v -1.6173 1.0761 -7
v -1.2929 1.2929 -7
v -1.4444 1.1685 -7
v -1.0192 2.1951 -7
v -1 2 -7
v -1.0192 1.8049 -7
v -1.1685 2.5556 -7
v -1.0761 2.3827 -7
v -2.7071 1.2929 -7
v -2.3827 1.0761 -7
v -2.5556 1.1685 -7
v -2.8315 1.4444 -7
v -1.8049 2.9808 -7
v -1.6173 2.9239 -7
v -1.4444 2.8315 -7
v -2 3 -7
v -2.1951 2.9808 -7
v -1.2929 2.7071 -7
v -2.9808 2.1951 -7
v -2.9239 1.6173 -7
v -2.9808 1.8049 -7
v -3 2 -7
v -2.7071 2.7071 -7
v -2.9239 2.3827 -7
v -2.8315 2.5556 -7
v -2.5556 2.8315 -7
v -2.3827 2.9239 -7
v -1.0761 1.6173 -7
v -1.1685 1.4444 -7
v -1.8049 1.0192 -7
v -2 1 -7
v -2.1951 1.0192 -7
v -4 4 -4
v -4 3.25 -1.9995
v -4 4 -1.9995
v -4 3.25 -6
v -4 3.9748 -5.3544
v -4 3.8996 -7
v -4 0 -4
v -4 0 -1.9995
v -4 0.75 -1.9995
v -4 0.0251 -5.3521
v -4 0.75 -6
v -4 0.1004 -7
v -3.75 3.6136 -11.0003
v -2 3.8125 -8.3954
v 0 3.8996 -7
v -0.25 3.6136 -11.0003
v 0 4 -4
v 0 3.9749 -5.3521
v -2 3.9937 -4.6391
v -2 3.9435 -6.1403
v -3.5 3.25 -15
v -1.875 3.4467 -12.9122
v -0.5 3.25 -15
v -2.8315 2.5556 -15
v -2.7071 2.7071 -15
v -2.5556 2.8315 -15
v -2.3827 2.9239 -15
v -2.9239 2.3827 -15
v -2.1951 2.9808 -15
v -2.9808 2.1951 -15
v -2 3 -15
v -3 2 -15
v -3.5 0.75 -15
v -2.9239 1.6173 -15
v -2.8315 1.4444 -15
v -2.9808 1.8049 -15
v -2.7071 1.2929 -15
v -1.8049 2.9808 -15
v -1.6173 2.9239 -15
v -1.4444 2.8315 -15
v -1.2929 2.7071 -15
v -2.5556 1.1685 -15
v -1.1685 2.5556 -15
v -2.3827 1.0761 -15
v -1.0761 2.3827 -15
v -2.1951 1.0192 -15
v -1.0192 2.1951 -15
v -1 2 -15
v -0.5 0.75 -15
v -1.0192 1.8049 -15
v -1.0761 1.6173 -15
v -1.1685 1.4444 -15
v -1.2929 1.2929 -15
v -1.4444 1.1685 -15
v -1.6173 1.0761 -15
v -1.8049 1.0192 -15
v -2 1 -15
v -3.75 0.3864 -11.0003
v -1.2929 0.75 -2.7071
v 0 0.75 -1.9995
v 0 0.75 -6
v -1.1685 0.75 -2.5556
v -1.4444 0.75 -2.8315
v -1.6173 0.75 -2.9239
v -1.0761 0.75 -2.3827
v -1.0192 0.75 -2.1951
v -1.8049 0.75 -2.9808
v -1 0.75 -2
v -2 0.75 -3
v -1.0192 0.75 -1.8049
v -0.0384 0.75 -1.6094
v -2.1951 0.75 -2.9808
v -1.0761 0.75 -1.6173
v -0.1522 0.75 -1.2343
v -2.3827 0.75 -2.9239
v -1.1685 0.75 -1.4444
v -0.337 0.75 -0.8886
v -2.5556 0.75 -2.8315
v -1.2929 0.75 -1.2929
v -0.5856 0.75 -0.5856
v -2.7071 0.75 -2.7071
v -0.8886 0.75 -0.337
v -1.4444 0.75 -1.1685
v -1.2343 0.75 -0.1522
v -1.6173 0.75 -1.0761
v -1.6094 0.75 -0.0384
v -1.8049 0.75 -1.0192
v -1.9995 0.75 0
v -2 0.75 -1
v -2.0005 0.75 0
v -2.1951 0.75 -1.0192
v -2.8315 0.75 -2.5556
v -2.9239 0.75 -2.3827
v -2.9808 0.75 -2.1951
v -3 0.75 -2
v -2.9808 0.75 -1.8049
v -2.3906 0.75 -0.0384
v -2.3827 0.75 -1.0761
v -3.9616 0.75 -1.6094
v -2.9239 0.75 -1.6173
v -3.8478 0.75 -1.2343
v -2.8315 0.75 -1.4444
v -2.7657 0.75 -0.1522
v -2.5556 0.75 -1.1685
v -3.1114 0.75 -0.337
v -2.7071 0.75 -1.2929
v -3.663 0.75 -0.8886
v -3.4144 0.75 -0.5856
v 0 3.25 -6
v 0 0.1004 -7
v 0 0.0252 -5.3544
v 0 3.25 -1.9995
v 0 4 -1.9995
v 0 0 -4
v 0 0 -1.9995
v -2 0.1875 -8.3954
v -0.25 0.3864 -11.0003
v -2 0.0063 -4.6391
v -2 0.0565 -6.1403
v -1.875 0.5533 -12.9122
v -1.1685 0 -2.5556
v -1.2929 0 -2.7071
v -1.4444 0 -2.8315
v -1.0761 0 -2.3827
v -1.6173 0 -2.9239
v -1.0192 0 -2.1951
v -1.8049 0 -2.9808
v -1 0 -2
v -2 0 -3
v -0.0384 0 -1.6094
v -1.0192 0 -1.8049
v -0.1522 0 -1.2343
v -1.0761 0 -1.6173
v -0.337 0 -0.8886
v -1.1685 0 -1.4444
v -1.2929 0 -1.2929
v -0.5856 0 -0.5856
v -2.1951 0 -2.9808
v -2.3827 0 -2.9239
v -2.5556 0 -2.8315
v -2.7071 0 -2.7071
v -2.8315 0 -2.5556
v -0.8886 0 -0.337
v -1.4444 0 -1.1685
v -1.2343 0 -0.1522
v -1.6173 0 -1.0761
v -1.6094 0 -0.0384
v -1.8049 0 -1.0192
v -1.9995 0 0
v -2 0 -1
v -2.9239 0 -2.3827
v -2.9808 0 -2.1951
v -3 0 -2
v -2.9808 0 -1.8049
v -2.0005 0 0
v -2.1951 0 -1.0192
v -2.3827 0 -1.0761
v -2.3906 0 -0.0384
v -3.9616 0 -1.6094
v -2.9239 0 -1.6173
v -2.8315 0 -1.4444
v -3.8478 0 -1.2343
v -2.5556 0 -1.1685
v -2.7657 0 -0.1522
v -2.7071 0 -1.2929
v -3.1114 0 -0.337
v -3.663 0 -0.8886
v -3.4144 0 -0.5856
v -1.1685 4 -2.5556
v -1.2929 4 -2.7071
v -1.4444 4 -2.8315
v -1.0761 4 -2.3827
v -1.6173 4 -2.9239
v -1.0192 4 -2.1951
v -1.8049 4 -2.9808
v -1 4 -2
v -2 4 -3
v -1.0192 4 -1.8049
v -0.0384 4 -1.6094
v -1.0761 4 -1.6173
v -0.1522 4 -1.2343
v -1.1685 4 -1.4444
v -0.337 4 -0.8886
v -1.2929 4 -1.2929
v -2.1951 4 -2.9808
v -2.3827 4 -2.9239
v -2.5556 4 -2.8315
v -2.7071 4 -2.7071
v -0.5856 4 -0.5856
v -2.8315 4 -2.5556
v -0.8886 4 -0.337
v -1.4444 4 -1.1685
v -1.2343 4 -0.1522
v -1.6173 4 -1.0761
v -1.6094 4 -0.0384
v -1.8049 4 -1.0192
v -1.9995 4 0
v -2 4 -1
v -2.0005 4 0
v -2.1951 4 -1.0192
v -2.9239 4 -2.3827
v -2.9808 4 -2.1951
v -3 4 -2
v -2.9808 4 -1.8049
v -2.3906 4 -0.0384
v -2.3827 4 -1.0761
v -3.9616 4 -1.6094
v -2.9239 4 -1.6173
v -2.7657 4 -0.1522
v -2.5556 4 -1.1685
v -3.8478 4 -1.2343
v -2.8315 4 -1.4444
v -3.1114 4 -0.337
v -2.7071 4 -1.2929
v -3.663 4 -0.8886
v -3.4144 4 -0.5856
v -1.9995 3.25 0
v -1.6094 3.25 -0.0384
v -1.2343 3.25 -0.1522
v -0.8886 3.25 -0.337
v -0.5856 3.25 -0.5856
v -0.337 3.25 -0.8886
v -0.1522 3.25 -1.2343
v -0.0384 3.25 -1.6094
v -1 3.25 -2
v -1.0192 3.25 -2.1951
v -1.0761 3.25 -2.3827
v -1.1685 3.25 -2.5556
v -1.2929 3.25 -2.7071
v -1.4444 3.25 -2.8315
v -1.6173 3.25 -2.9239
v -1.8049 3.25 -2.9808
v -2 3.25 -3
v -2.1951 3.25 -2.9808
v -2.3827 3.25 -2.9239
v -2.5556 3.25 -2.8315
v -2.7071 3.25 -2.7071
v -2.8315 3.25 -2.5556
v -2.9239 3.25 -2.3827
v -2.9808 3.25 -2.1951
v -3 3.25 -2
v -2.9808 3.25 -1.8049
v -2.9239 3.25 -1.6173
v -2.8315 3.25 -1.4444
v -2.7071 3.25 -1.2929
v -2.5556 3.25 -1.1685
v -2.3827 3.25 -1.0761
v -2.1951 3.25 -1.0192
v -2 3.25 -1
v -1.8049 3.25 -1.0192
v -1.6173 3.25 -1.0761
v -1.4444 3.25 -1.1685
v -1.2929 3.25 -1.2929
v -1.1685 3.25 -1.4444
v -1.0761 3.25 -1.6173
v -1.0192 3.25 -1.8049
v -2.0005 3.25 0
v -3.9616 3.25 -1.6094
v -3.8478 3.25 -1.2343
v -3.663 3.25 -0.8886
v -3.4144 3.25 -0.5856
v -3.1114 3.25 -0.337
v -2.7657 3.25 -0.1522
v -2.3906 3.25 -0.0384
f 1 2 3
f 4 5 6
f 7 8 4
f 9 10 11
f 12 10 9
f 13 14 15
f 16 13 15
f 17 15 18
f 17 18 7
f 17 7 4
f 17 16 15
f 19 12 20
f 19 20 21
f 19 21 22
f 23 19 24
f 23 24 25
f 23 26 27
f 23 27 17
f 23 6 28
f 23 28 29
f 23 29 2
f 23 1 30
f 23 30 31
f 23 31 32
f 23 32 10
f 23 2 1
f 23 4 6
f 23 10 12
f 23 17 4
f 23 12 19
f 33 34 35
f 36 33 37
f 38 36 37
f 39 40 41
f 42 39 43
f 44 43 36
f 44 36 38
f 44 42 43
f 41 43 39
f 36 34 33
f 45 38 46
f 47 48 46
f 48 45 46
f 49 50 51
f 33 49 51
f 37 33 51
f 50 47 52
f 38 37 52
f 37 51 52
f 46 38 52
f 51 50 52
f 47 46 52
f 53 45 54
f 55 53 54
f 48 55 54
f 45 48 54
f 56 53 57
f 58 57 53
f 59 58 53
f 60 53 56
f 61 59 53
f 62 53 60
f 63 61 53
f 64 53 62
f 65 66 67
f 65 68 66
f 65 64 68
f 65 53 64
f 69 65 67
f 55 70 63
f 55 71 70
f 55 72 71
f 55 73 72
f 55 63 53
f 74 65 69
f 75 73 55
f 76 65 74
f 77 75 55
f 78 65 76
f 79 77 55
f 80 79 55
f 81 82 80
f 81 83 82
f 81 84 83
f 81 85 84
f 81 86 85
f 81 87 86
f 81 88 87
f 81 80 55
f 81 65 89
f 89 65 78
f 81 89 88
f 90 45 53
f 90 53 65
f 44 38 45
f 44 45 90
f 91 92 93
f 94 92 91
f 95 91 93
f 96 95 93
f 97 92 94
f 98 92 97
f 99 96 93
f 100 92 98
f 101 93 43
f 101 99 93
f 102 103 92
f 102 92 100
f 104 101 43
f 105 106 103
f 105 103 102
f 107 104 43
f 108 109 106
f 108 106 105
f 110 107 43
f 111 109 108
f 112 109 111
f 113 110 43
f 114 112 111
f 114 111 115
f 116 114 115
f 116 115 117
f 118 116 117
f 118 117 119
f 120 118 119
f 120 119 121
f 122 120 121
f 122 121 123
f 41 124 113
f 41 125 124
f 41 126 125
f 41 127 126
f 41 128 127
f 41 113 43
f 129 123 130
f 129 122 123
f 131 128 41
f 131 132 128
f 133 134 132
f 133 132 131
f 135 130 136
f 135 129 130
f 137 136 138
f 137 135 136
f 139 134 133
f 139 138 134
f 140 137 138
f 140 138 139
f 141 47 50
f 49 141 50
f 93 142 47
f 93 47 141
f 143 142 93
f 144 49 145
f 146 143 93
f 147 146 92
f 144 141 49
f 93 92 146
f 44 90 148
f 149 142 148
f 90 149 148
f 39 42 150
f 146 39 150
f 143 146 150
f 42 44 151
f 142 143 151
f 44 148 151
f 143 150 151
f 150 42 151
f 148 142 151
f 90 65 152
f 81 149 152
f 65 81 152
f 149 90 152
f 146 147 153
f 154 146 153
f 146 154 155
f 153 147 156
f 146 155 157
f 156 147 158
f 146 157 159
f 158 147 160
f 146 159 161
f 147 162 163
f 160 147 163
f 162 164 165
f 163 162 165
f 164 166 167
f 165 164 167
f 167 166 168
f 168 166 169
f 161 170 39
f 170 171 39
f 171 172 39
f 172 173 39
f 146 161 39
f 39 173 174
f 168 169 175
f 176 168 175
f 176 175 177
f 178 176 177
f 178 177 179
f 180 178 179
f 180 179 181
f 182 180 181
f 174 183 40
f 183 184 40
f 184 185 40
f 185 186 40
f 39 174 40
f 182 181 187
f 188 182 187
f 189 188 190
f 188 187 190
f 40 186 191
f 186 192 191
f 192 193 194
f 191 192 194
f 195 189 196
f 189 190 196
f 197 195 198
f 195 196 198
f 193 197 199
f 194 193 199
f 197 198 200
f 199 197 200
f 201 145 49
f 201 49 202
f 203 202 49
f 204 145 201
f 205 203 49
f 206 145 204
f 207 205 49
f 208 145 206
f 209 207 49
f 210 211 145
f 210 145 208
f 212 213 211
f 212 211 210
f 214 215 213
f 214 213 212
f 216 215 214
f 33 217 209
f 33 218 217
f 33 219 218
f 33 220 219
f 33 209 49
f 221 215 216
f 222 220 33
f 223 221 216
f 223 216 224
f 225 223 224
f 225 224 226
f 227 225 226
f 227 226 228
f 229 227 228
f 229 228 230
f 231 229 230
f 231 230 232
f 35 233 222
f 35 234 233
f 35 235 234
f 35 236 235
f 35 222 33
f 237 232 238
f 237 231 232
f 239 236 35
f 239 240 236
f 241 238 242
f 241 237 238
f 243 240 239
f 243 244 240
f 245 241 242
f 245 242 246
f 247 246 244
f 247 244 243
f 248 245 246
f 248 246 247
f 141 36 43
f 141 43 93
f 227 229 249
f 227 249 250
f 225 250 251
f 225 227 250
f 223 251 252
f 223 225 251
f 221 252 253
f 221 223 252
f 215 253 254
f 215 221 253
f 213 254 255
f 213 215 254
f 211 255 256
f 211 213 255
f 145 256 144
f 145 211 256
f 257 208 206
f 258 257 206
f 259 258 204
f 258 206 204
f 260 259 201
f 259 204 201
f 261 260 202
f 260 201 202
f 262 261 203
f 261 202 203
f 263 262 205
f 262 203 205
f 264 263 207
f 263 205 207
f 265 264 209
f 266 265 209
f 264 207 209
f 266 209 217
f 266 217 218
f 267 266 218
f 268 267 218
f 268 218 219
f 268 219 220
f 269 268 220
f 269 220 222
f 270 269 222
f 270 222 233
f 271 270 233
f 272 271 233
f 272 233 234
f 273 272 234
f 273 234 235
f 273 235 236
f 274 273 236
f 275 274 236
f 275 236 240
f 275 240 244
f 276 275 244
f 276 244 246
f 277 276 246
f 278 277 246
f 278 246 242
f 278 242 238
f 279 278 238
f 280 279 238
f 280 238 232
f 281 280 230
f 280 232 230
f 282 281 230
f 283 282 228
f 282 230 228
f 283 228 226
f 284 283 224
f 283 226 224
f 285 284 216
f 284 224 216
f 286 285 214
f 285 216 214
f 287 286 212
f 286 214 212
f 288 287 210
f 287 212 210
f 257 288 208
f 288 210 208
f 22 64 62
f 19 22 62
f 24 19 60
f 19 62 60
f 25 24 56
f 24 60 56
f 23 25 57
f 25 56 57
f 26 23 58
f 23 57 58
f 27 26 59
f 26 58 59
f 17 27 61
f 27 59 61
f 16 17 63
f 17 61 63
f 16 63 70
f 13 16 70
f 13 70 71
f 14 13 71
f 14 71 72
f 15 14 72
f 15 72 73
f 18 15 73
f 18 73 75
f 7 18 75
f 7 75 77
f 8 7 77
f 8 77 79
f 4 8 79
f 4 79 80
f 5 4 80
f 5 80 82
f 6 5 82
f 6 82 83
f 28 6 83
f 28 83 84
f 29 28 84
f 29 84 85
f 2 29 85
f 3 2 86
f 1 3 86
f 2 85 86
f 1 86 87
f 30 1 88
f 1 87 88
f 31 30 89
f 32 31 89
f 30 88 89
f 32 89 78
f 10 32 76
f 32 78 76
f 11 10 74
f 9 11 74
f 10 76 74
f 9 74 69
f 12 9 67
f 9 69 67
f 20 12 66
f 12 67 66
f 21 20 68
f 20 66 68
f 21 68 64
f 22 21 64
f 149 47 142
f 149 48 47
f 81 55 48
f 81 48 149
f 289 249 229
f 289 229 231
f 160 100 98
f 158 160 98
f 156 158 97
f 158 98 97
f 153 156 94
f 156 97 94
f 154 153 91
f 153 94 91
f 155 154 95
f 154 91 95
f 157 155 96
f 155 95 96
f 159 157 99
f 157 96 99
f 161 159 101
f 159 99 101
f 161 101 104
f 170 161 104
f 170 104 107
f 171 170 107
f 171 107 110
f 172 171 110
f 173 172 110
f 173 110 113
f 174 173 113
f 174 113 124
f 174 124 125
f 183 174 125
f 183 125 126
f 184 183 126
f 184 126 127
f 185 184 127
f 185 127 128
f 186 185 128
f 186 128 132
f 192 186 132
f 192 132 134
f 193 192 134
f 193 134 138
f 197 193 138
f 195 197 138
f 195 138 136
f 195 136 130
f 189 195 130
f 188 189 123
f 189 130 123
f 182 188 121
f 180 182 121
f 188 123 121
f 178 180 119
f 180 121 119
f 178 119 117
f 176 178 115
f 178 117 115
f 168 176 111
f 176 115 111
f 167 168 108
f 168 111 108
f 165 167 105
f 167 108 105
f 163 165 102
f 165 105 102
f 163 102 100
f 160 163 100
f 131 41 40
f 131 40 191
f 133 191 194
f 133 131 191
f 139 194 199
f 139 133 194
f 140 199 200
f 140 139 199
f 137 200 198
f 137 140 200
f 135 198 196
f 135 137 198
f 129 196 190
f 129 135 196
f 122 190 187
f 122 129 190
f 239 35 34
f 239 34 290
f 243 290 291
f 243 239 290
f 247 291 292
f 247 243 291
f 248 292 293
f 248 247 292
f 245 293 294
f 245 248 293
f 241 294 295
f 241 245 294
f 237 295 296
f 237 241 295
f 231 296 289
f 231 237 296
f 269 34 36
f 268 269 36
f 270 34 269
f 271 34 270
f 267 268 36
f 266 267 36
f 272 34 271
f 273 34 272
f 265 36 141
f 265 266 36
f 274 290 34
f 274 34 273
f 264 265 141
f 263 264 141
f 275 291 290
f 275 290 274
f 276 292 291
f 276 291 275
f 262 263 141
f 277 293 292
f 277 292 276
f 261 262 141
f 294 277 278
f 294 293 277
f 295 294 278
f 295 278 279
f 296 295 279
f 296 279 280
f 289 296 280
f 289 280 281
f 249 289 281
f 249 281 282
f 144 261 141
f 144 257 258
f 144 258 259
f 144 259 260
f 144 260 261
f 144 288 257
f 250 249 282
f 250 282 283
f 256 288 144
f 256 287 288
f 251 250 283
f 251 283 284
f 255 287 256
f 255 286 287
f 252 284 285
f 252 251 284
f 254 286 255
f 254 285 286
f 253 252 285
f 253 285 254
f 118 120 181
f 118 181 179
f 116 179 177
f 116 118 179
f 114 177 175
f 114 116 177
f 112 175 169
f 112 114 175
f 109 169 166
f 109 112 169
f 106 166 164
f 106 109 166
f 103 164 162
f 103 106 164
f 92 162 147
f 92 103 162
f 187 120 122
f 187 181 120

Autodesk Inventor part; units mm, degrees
ref_plane "YZ Plane" through (0, 0, 0) normal (1, 0, 0) x (0, 1, 0)
ref_plane "XZ Plane" through (0, 0, 0) normal (0, 1, 0) x (-1, 0, 0)
ref_plane "XY Plane" through (0, 0, 0) normal (0, 0, 1) x (1, 0, 0)
sketch "Sketch6" plane through (0, 0, 0) normal (0, 1, 0) x (-1, 0, 0)
  line L0 (0, 0) -> (4, 0)
  line L1 (4, 0) -> (4, -15)
  line L2 (4, -15) -> (0, -15)
  line L3 (0, -15) -> (0, 0)
  dimension "d17" = 4
  dimension "d18" = 15
extrude "Extrusion5" add sketch "Sketch6" along normal blind 4
sketch "Sketch7" plane through (-4, 0, 0) normal (0, 0, 1) x (1, 0, 0)
  line L0 (0, 0) -> (0, 4) projected
  line L1 (4, 0) -> (4, 4) projected
  line L2 (0, 3.25) -> (4, 3.25)
  line L3 (4, 3.25) -> (4, 0.75)
  line L4 (4, 0.75) -> (0, 0.75)
  line L5 (0, 0.75) -> (0, 3.25)
  line L6 (0, 4) -> (4, 4) projected
  line L7 (4, 0) -> (0, 0) projected
  dimension "d21" = 0.75
  dimension "d22" = 0.75
extrude "Extrusion6" cut sketch "Sketch7" against normal blind 6 contours L0 L2 L1 L4
sketch "Sketch8" plane through (0, 4, 0) normal (0, 1, 0) x (1, 0, 0)
  line L0 (-4, 6) -> (0, 6) projected
  line L1 (-4, 15) -> (-4, 0) projected
  line L2 (0, 0) -> (-4, 0) projected
  line L3 (-4, 6) -> (-4, 0)
  circle A0 centre (-2, 2) radius 1
  dimension "d25" = 2
extrude "Extrusion7" cut sketch "Sketch8" against normal blind 4
sketch "Sketch9" plane through (0, 0, -15) normal (0, 0, -1) x (-1, 0, 0)
  line L0 (4, 0) -> (0, 0) projected
  line L1 (4, 0) -> (4, 4) projected
  line L2 (0, 4) -> (4, 4) projected
  line L3 (0, 0) -> (0, 4) projected
  circle A0 centre (2, 2) radius 1
  point P0 (0, 0)
  dimension "d28" = 2
extrude "Extrusion8" cut sketch "Sketch9" against normal blind 8 contours A0
sketch "Sketch10" plane through (0, 0, 0) normal (1, 0, 0) x (0, 0, -1)
  line L0 (0, 3.25) -> (6, 3.25) projected
  line L1 (6, 3.25) -> (6, 0.75) projected
  line L2 (6, 0.75) -> (0, 0.75) projected
  line L3 (0, 0) -> (0, 0.75) projected
  line L4 (15, 0) -> (0, 0) projected
  line L5 (15, 0) -> (15, 4) projected
  line L6 (0, 4) -> (15, 4) projected
  line L7 (0, 3.25) -> (0, 4) projected
  line L8 (15, 4) -> (0, 4) projected
  line L9 (4, 4) -> (7.2907, 4) construction
  line L10 (15, 0) -> (15, 4) projected
  line L11 (7.2907, 4) -> (15, 3.25) construction
  spline S0 degree 2 poles (4, 4) (7.2907, 4) (15, 3.25) knots 1 1 1 2 2 2
  line L12 (6, 3.25) -> (6, 0.75) projected
  line L13 (6, 2) -> (3.448, 2)
  line L14 (4, 0) -> (7.2907, 0) construction
  line L15 (7.2907, 0) -> (15, 0.75) construction
  spline S1 degree 2 poles (4, 0) (7.2907, 0) (15, 0.75) knots 1 1 1 2 2 2
  dimension "d31" = 0.75
extrude "Extrusion9" cut sketch "Sketch10" against normal blind 8 contours L6 L5 S0
pattern_circular "Circular Pattern1" count 2 over 360 about axis through (-2, 2, -15) along (0, 0, 1) of "Extrusion9"
fillet "Fillet1" radius 2 4 edges at (0, 3.625, 0) (-4, 3.625, 0) (0, 0.375, 0) (-4, 0.375, 0)
chamfer "Chamfer1" distance 8 distance2 0.5 1 edges at (0, 2, -15) measured on face at (0, 1.5833, -12)
chamfer "Chamfer2" distance 0.5 distance2 8 1 edges at (-4, 2, -15) measured on face at (-3.6667, 2, -15)
properties part number "metalClevisis" material "Aluminum 6061"
